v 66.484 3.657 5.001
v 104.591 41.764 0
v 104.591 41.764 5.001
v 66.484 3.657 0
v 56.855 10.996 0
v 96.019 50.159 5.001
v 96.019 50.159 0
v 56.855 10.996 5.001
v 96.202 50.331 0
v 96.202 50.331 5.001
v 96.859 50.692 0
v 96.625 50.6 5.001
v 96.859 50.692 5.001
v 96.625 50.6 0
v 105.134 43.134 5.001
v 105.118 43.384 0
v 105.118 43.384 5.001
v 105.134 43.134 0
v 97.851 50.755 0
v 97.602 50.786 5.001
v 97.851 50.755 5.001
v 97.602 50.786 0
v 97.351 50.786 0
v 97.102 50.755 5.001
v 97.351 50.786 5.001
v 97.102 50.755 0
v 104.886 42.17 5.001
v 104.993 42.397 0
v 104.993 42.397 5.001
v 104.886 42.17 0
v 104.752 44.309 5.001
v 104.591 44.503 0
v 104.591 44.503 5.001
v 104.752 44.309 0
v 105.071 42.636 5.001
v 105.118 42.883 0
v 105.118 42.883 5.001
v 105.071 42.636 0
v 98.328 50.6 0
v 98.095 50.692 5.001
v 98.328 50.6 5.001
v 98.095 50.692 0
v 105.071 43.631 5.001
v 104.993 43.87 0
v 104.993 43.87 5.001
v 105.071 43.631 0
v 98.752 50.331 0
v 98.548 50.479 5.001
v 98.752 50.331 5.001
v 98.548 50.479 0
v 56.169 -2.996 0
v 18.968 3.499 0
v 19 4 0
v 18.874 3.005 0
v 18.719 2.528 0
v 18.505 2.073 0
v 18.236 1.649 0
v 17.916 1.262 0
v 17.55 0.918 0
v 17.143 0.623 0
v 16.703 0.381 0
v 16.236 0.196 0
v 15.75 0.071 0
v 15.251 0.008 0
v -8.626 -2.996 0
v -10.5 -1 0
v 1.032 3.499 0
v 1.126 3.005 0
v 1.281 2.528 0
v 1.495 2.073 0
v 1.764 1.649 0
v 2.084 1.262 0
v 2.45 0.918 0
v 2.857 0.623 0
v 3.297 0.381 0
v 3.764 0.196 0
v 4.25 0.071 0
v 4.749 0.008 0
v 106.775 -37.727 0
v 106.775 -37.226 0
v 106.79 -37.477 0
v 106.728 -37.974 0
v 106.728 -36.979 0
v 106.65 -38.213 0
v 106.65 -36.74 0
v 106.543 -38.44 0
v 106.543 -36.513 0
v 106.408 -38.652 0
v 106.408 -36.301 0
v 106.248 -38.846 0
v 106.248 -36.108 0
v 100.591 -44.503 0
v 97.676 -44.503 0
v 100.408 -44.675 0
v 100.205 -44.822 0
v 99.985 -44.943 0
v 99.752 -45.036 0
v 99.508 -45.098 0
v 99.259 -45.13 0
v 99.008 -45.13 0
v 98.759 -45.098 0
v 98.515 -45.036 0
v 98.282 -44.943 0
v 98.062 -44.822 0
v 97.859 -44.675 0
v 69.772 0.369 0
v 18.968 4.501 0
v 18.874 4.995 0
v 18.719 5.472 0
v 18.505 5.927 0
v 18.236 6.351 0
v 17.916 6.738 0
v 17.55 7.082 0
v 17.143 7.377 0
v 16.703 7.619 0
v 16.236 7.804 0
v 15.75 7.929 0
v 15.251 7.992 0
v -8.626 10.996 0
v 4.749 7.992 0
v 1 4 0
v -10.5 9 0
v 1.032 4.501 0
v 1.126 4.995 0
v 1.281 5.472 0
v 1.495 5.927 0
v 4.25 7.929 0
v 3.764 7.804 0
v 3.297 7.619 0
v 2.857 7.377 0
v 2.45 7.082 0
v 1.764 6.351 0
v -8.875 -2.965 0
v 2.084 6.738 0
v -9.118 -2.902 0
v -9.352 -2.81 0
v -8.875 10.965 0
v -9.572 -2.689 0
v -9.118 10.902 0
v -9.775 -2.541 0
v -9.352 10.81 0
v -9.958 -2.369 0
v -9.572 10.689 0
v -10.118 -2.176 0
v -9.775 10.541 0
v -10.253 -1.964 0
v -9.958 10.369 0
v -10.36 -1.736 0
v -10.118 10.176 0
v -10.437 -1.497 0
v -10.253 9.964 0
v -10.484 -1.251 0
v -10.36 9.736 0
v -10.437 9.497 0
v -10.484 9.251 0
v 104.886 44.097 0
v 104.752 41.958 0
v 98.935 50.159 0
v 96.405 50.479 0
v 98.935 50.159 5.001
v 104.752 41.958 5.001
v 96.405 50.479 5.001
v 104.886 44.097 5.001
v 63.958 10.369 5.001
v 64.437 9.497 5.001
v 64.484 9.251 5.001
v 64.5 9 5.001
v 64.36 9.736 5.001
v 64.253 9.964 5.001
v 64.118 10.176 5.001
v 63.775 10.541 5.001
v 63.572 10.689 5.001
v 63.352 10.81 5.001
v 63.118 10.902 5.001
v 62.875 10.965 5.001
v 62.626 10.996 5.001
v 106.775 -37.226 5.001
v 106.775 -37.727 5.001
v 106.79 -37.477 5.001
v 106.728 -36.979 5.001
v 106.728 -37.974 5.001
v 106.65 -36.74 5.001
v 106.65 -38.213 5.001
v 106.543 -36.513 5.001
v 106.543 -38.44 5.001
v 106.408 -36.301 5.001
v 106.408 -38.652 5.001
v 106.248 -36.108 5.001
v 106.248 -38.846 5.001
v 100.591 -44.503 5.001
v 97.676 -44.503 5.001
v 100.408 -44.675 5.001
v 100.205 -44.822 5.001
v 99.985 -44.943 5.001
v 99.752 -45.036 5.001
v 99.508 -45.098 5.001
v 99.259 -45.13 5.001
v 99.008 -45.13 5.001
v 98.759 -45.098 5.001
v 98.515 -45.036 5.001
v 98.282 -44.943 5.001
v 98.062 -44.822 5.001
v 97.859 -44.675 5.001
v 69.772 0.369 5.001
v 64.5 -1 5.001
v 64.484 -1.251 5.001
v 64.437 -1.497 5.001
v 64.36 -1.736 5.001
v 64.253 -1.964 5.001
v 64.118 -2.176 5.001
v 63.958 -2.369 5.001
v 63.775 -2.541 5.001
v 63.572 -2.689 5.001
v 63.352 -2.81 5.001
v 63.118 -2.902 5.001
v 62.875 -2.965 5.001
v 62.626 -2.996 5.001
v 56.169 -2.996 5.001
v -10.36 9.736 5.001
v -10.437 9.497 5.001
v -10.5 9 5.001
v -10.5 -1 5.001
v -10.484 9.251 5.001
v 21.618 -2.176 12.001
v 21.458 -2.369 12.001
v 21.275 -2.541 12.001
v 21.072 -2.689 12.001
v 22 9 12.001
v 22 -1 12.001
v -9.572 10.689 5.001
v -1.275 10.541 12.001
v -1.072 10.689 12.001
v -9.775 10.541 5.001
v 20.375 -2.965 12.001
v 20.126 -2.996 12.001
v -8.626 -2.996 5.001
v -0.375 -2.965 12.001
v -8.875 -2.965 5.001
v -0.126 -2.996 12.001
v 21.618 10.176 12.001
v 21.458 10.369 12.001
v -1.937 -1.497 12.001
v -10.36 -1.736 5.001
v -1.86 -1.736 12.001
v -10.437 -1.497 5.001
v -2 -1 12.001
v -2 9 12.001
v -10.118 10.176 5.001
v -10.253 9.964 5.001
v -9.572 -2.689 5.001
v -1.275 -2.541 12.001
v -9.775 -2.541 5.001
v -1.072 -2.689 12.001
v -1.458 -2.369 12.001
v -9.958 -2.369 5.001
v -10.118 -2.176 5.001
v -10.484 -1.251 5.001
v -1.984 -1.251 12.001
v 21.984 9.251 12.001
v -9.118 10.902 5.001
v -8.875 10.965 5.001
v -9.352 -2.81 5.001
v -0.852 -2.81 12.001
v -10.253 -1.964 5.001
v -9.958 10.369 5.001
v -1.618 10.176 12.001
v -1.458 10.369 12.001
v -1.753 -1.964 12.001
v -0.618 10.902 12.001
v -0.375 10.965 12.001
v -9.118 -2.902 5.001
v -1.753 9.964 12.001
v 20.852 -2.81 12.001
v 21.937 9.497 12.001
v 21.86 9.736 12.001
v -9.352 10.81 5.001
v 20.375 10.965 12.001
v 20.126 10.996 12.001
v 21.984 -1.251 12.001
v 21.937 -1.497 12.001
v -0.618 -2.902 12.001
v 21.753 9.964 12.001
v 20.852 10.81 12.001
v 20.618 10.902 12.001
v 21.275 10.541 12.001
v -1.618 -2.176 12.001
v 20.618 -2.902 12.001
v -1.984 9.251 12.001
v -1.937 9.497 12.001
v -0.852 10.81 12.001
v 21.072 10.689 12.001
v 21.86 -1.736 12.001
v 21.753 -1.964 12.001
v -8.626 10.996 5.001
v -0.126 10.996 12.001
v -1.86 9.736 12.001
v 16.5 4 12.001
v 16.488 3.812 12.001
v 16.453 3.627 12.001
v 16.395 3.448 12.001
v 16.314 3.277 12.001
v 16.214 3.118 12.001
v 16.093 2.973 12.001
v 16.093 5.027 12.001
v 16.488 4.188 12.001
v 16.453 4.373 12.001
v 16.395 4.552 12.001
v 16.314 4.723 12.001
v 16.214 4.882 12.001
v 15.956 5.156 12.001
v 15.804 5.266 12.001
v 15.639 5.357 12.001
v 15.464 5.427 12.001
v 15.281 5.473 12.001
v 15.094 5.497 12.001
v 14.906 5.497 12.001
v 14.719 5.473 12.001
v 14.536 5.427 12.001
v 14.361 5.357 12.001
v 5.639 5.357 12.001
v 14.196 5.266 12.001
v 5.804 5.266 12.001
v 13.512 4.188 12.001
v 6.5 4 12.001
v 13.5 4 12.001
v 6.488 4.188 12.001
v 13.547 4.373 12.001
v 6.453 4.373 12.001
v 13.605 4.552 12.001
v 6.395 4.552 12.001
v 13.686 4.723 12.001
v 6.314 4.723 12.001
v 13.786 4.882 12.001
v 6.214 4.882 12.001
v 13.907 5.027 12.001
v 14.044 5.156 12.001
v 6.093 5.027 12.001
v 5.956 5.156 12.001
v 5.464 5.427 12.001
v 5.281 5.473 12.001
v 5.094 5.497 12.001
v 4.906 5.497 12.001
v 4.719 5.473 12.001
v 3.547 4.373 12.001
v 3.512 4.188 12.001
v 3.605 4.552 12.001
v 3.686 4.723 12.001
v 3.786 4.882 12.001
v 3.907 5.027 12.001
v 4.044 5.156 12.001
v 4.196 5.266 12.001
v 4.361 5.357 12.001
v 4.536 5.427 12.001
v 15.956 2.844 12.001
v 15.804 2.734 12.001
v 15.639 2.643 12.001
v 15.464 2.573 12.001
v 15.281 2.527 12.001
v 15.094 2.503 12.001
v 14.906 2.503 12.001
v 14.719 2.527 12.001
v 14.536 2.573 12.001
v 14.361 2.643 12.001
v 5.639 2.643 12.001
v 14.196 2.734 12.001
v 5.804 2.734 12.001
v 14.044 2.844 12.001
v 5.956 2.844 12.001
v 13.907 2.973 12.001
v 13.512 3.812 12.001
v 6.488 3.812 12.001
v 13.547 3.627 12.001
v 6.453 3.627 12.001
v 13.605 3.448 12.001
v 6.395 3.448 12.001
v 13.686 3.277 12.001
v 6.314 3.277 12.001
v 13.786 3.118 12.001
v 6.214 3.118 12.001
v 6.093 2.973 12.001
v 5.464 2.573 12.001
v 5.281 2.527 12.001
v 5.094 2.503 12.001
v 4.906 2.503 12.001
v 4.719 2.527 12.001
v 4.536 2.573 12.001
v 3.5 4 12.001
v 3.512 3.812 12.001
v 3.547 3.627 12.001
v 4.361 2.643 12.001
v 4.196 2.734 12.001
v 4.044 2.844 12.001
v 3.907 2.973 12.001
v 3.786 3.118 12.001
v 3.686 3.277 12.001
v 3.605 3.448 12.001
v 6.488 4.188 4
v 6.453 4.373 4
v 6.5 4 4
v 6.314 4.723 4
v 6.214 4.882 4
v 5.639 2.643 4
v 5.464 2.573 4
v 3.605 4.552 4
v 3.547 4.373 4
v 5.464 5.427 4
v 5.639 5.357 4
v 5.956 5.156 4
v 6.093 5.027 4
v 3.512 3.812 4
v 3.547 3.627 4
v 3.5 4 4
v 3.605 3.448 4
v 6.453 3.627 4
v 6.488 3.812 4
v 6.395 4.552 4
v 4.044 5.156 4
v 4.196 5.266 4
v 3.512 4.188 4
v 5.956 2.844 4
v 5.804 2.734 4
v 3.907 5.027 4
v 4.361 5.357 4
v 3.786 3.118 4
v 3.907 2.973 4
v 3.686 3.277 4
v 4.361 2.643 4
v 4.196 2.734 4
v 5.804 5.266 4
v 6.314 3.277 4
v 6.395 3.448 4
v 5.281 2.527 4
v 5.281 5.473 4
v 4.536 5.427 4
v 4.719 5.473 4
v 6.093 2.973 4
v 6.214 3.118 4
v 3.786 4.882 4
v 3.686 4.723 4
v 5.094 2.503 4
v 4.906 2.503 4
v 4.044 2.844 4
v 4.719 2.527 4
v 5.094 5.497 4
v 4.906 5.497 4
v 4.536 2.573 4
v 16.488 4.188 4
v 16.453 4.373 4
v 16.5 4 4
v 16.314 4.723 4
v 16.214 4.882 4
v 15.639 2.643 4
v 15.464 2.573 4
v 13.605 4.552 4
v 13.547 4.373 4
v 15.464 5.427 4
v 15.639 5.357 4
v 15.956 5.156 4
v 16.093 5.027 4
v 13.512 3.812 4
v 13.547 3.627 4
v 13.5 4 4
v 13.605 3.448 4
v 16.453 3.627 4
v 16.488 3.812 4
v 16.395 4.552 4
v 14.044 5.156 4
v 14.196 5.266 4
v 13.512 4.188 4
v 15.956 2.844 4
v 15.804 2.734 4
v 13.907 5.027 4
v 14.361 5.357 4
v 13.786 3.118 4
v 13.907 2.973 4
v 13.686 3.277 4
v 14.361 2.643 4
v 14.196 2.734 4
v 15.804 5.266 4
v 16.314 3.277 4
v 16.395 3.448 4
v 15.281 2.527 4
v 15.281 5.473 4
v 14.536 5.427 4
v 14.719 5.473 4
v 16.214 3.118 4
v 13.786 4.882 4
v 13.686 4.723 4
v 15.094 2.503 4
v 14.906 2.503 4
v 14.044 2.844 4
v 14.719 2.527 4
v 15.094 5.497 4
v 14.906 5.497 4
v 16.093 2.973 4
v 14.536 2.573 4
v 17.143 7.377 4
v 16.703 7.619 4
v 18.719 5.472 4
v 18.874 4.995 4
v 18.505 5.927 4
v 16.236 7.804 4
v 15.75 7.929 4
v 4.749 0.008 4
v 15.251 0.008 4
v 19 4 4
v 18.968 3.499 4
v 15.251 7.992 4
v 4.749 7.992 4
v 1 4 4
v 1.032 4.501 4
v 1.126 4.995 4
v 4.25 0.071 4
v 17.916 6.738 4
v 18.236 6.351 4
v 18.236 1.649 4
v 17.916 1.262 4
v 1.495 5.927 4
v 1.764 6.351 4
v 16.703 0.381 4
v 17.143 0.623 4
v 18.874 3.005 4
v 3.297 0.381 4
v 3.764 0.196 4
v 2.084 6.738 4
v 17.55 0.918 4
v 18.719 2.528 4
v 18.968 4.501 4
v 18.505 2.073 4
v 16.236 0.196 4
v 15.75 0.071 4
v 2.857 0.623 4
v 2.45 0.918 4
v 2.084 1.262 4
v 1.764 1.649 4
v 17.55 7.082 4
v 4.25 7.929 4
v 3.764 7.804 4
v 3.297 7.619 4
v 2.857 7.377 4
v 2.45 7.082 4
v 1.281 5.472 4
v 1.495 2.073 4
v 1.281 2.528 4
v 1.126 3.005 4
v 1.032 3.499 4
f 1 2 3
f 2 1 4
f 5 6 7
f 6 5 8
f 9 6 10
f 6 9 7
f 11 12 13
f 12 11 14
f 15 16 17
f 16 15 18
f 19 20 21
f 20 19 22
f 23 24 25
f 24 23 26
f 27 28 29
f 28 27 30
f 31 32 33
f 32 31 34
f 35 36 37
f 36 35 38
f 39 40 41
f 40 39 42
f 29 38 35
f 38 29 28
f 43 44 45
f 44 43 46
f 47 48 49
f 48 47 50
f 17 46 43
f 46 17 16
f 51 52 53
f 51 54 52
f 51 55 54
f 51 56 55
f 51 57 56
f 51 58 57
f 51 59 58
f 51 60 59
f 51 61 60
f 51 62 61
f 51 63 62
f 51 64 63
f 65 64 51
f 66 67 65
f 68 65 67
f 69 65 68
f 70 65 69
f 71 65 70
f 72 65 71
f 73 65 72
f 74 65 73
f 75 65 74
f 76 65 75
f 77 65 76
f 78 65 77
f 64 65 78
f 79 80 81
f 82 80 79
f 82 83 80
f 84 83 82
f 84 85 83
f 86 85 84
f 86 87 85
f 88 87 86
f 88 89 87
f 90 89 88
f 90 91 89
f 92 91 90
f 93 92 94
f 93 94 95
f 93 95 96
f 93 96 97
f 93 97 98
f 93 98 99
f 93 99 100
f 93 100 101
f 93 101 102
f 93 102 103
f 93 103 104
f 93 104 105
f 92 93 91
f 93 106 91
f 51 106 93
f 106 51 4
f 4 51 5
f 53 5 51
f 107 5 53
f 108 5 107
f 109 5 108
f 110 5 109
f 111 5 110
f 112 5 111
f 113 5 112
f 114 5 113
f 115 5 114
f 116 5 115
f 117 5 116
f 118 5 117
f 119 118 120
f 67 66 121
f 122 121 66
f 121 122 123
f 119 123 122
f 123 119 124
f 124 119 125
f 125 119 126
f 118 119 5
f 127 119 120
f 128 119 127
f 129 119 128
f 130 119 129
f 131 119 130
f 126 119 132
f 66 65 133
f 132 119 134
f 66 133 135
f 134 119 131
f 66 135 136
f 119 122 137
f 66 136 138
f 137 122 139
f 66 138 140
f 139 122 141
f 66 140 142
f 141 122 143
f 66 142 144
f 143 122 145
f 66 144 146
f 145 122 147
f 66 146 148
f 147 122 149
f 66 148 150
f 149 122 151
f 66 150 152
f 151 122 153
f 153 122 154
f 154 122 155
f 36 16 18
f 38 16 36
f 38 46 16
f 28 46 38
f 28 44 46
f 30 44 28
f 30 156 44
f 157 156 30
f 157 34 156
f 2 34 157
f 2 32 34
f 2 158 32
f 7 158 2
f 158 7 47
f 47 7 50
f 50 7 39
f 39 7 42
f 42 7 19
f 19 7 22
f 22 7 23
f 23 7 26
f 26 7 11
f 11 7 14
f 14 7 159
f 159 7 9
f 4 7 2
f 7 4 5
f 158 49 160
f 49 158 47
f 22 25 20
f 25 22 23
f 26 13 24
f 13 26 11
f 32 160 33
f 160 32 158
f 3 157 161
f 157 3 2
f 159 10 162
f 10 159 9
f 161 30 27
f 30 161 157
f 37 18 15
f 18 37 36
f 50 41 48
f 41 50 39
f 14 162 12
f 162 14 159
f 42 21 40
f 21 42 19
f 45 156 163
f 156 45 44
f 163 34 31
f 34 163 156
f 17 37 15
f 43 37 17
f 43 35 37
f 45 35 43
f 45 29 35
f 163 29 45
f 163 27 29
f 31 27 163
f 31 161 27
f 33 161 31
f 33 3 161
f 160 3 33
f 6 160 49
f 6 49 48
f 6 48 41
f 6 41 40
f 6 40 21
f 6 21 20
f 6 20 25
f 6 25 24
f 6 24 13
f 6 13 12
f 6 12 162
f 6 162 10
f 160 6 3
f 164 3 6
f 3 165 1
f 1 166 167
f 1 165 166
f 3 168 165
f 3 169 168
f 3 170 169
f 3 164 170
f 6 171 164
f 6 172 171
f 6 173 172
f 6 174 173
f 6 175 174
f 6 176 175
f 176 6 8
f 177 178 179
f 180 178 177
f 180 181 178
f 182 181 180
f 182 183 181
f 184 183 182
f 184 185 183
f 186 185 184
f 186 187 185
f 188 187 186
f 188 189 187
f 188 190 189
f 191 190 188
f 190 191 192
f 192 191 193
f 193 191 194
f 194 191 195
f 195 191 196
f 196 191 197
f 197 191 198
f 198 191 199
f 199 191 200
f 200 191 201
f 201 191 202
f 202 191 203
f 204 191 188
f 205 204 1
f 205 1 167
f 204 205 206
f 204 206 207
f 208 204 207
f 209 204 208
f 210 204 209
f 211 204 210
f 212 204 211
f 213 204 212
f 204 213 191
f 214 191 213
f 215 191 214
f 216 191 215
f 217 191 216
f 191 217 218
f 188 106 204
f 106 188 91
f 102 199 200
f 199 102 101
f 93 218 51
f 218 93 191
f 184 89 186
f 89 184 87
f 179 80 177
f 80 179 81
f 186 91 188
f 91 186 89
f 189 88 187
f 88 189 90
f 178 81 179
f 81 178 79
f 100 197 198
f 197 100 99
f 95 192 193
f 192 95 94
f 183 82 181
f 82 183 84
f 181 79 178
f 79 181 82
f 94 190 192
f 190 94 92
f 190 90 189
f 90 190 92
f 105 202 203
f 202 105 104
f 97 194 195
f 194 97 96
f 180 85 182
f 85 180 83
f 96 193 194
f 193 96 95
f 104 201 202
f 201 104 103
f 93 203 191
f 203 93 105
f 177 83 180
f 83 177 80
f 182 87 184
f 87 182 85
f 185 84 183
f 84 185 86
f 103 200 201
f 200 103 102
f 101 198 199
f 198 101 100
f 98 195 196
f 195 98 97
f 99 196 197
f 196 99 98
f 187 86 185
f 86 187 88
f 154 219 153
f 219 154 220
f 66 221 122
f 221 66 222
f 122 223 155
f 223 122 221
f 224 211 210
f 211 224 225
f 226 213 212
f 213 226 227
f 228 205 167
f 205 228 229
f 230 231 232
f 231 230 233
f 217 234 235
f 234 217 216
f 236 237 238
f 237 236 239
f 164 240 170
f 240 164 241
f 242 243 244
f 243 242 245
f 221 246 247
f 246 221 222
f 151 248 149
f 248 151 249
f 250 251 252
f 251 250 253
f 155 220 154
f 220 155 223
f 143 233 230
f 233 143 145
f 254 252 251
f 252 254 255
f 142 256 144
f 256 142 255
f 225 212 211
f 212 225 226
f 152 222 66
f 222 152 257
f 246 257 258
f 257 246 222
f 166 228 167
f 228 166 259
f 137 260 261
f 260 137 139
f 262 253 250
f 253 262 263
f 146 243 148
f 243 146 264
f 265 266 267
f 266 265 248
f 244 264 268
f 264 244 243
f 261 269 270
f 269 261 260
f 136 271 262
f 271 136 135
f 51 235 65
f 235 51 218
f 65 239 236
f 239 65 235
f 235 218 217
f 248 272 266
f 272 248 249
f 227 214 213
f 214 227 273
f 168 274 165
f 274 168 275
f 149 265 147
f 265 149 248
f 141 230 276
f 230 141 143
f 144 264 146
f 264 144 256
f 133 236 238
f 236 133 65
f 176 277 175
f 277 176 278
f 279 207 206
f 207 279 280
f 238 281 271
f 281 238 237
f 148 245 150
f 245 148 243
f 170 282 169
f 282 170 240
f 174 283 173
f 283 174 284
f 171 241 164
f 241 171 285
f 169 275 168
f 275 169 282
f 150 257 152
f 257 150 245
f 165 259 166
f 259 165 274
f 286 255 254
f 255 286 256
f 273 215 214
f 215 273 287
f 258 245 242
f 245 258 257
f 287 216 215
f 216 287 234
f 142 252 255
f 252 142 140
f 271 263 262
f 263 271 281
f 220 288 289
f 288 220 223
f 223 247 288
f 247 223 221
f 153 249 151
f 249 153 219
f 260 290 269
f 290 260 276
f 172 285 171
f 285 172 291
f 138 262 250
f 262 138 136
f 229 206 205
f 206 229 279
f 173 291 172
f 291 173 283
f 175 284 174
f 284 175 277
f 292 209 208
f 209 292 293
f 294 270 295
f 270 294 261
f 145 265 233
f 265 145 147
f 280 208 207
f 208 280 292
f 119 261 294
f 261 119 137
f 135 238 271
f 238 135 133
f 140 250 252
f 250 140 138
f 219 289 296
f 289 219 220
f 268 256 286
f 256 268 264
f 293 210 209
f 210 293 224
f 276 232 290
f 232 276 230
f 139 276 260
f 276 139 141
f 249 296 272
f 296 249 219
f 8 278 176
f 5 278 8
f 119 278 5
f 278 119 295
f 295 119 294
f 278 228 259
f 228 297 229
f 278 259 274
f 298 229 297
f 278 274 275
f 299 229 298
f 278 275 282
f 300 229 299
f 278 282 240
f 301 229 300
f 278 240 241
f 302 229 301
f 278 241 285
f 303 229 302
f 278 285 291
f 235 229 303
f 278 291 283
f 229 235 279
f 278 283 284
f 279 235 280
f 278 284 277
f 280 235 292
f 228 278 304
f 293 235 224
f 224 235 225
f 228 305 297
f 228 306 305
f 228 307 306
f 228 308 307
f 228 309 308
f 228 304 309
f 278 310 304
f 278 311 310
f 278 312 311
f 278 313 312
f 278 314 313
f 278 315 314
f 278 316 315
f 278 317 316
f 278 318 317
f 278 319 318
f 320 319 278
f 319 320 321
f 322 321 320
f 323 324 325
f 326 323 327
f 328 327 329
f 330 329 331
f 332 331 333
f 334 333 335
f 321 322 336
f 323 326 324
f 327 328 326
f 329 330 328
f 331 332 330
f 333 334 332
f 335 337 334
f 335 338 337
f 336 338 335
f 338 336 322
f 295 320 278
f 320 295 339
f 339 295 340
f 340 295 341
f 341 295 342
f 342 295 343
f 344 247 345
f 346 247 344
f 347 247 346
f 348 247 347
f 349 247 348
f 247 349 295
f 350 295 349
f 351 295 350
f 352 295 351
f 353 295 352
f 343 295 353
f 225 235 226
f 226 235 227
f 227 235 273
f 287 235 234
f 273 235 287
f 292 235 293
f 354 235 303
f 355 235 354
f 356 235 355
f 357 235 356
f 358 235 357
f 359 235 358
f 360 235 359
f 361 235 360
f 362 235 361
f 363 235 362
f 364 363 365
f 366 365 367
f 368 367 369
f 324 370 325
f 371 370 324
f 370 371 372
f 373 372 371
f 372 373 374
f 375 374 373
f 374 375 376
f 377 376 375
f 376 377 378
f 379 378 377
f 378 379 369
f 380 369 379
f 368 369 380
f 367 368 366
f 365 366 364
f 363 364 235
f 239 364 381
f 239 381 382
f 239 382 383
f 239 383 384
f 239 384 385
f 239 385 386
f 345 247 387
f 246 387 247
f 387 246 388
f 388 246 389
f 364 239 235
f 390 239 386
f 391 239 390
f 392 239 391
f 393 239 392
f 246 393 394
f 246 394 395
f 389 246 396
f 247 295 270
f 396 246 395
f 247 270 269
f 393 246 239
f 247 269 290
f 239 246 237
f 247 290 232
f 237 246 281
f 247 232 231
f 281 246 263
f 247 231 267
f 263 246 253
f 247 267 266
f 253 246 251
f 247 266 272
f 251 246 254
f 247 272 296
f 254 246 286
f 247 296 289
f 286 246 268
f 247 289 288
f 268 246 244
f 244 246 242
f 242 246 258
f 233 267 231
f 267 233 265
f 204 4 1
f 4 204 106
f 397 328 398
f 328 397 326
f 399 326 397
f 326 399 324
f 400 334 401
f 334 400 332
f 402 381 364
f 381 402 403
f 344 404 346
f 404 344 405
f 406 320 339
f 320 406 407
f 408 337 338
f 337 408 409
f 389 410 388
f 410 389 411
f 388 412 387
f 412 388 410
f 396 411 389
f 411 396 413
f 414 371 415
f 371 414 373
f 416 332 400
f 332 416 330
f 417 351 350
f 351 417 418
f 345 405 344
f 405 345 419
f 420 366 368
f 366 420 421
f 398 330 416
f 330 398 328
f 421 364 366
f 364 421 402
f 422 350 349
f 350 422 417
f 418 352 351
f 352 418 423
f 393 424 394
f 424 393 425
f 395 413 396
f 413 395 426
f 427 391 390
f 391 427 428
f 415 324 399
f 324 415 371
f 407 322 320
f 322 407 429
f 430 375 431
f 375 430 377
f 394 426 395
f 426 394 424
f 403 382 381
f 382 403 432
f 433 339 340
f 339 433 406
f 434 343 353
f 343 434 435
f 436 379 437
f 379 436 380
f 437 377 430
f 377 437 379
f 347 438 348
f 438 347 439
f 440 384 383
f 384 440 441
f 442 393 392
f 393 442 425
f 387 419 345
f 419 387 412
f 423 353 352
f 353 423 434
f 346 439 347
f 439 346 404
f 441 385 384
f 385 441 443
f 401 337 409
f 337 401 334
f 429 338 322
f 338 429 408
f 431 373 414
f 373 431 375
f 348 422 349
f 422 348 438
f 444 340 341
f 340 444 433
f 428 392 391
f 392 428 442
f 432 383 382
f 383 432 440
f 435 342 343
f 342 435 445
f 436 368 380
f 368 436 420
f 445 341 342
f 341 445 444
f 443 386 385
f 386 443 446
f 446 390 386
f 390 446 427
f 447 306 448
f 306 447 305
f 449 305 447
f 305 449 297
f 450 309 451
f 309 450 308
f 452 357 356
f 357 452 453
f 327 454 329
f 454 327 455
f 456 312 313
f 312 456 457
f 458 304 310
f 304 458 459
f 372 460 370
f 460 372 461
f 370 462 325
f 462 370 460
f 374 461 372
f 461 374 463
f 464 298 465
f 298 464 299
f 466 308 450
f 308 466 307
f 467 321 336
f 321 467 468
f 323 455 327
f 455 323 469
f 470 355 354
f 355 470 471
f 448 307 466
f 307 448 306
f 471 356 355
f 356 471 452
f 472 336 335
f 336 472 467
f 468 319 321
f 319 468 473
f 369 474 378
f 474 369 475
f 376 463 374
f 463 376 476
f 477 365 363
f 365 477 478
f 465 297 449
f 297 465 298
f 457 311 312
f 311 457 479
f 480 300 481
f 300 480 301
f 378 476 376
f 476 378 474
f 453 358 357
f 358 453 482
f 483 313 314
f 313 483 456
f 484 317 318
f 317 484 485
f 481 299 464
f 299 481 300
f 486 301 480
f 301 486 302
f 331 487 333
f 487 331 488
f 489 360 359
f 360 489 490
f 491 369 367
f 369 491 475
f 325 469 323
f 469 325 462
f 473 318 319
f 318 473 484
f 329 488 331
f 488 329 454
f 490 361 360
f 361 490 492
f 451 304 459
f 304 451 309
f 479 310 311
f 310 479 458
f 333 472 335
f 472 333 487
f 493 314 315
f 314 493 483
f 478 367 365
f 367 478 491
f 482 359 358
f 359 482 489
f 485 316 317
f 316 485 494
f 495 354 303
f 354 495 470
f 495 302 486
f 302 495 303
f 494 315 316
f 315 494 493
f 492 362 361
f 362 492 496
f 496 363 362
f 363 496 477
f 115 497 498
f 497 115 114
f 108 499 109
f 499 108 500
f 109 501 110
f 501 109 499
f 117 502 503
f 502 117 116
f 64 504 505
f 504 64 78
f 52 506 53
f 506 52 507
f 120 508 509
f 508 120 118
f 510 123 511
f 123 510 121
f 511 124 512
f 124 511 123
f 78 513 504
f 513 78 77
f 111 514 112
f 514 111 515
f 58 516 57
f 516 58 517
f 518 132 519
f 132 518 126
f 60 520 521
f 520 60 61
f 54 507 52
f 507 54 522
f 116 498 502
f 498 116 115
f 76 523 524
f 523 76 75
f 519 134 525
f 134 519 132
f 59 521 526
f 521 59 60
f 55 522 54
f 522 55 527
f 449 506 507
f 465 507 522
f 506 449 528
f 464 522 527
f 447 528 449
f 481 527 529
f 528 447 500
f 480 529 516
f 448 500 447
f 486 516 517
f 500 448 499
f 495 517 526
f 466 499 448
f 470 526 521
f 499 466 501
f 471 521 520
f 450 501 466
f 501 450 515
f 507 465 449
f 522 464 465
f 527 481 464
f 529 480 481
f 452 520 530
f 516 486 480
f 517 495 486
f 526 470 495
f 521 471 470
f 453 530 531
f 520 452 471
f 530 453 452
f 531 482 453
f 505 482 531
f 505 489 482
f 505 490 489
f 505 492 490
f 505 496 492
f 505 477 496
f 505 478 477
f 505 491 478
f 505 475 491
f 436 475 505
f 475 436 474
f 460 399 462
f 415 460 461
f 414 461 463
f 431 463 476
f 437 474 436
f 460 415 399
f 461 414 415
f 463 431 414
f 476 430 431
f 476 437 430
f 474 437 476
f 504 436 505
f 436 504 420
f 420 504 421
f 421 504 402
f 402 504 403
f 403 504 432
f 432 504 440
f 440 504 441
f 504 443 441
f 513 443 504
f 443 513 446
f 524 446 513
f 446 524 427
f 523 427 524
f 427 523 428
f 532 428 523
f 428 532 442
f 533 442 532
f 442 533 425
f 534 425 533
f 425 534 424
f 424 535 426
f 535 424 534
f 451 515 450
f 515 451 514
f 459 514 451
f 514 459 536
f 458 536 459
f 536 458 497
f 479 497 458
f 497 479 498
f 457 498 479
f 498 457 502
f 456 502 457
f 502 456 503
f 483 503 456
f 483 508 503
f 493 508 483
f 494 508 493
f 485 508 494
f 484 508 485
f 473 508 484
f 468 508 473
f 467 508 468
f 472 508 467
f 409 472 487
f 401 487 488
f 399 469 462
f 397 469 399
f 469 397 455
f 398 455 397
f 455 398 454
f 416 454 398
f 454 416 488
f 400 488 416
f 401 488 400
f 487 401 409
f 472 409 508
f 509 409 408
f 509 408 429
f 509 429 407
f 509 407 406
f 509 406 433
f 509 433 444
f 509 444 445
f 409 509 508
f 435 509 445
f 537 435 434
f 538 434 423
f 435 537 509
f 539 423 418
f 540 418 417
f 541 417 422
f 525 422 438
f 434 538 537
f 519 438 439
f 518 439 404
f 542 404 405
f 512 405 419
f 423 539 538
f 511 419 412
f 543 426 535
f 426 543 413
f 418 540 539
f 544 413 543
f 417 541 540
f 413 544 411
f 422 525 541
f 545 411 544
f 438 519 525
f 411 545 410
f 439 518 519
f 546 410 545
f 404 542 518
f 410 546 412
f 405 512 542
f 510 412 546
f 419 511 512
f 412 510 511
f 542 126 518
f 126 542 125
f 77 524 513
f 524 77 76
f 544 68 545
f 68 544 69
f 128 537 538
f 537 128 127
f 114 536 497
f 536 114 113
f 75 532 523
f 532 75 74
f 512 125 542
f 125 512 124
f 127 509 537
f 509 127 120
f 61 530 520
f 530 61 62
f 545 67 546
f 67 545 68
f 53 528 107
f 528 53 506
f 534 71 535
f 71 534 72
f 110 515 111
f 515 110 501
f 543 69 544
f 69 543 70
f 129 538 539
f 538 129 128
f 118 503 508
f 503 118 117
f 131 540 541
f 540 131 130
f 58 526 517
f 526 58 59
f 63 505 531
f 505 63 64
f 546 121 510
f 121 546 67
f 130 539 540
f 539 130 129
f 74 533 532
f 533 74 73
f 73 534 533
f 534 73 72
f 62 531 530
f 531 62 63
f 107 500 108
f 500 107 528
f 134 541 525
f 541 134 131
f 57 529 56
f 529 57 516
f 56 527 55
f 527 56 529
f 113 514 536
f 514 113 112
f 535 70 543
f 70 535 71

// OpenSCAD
 $fn=50;
 
module loadcell_scale_base(){
   
    render()difference(){
        
    minkowski(){
        
        union(){
            
            hull(){
             //translate([0.1,-1,12])rotate(a=180-30,v=[0,1,0])cube([10.5,14-4,0.1]);
                translate([-8.5,-1,0])cube([75-4,14-4,5]);
                translate([0,-1,5])cube([20,14-4,7]);
          
            
            }
            translate([18.75,-1,7.15])rotate(a=15,v=[0,1,0])cube([20,14-4,5]);
           
           
             translate([60,0,0])rotate(a=45, v=[0,0,1])cube([65-4,12-4,5]);
            translate([60-4,0,0])rotate(a=-45, v=[0,0,1])cube([65-4,12-4,5]);
        }
       
        cylinder(r=2,h=0.001);
    }
    
        color("red")translate([5,6-2,0])cylinder(r=1.5, h=16);
        color("red")translate([15,6-2,0])cylinder(r=1.5, h=16);
        hull(){
        color("red")translate([5,6-2,0])cylinder(r=4, h=4);
        color("red")translate([15,6-2,0])cylinder(r=4, h=4);
        }
    
    }   
}

module load_scale_bed(){
    render()difference(){
        minkowski(){
            union(){
            translate([0,0,0])cube([20,12-4,5], center=true);
            cylinder(r1=36, r2=40, h=3);
        }
            cylinder(r=2,h=0.001);
        }
        color("red")translate([-5,0,0])cylinder(r=1.5, h=12, center=true);
        color("red")translate([5,0,0])cylinder(r=1.5, h=12, center=true);
        //hull(){
        //color("red")translate([-5,0,0])cylinder(r=5, h=5, center=true);
        //color("red")translate([5,0,0])cylinder(r=5, h=5, center=true);
        //}
        }
    }

loadcell_scale_base();
//translate([10+75-20,4+30,15+12])rotate(a=180,v=[0,1,0])load_scale_bed();
